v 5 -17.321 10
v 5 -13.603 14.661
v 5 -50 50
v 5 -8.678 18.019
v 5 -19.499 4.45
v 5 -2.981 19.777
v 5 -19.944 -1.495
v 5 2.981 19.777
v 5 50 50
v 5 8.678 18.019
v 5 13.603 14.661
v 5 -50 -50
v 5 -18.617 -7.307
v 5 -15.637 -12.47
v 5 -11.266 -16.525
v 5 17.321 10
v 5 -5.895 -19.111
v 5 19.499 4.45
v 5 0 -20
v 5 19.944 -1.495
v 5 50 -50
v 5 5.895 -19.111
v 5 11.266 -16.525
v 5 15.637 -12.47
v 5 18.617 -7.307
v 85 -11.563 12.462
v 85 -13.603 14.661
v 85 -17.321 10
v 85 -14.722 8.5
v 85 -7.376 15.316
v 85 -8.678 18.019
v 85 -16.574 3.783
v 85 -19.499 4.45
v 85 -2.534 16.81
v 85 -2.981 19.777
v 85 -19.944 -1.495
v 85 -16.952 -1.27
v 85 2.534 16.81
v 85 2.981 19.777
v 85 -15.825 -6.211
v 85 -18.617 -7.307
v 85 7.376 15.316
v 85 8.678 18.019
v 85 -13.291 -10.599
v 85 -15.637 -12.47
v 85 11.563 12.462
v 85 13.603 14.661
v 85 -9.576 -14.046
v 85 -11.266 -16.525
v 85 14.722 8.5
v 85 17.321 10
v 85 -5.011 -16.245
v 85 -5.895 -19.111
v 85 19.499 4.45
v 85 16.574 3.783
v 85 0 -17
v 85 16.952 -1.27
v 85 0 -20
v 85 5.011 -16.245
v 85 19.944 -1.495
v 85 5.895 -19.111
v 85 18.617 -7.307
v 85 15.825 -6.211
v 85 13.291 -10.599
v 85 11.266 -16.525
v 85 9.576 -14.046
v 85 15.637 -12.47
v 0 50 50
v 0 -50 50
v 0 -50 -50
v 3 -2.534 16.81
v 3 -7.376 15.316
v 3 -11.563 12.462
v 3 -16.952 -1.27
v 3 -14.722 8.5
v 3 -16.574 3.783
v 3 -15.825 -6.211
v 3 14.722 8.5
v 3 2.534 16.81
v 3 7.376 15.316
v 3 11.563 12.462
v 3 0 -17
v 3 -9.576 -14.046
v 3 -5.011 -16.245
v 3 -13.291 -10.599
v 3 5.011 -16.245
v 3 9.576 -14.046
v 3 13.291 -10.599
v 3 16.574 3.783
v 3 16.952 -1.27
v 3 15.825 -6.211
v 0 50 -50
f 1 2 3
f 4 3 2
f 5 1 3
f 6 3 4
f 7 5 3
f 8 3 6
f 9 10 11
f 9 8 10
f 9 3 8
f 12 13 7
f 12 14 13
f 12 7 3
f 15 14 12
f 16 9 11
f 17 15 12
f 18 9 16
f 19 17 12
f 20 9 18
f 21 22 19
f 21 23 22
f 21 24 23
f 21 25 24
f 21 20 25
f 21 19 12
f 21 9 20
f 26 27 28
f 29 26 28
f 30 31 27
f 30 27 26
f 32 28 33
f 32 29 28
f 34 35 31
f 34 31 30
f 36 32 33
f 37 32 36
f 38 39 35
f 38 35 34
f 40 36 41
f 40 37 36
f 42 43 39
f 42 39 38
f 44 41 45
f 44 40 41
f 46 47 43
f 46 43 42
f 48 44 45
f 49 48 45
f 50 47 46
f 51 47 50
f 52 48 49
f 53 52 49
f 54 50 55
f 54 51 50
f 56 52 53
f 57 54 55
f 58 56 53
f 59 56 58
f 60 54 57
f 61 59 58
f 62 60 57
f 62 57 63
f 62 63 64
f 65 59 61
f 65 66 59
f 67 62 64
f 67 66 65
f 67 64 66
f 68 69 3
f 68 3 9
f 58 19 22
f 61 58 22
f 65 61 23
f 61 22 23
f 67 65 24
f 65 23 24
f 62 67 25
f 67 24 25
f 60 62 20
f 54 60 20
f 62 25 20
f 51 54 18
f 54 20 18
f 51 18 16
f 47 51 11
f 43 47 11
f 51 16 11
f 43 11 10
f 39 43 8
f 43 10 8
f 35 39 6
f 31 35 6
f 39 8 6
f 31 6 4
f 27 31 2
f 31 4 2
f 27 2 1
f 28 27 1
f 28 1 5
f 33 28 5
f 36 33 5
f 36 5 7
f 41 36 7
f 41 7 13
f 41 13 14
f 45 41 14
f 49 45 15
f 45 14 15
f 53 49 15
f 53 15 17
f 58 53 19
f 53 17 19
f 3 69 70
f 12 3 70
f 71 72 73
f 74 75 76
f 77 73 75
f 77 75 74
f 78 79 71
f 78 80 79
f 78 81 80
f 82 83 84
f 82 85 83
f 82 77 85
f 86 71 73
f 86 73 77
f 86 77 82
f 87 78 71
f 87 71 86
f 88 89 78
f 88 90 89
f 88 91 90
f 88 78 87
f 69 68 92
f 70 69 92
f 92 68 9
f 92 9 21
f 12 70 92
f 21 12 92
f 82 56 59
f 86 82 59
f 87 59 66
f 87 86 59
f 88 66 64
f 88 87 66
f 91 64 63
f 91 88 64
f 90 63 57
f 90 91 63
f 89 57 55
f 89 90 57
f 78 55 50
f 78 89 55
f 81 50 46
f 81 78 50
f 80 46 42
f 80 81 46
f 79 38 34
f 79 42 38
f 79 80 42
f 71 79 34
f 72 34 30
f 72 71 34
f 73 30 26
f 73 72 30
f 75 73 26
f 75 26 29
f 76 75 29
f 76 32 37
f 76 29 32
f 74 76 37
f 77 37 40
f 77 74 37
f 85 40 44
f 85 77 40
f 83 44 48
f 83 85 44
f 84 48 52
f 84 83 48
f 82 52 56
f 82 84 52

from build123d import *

# Parameters (mm, degrees)
SKETCH1_W           = 100
SKETCH1_H           = 100
BOSS_EXTRUDE1_DEPTH = 5
SKETCH2_R           = 20
BOSS_EXTRUDE2_DEPTH = 80
SHELL1_T            = -3


with BuildPart() as part:
    # Sketch1 → Boss-Extrude1 (new body)
    with BuildSketch(Plane(origin=(0, 0, 0), x_dir=(0, 0, -1), z_dir=(1, 0, 0))):
        Rectangle(SKETCH1_W, SKETCH1_H)
    extrude(amount=BOSS_EXTRUDE1_DEPTH)

    # Sketch2 → Boss-Extrude2 (add)
    with BuildSketch(Plane(origin=(5, 0, 0), x_dir=(0, 0, -1), z_dir=(1, 0, 0))):
        Circle(SKETCH2_R)
    extrude(amount=BOSS_EXTRUDE2_DEPTH)

    # Shell1
    shell1_openings = [part.faces().sort_by_distance(p)[0] for p in [
        (85, 0, 0),
    ]]
    offset(amount=SHELL1_T, openings=shell1_openings, kind=Kind.INTERSECTION)


solid = part.part
